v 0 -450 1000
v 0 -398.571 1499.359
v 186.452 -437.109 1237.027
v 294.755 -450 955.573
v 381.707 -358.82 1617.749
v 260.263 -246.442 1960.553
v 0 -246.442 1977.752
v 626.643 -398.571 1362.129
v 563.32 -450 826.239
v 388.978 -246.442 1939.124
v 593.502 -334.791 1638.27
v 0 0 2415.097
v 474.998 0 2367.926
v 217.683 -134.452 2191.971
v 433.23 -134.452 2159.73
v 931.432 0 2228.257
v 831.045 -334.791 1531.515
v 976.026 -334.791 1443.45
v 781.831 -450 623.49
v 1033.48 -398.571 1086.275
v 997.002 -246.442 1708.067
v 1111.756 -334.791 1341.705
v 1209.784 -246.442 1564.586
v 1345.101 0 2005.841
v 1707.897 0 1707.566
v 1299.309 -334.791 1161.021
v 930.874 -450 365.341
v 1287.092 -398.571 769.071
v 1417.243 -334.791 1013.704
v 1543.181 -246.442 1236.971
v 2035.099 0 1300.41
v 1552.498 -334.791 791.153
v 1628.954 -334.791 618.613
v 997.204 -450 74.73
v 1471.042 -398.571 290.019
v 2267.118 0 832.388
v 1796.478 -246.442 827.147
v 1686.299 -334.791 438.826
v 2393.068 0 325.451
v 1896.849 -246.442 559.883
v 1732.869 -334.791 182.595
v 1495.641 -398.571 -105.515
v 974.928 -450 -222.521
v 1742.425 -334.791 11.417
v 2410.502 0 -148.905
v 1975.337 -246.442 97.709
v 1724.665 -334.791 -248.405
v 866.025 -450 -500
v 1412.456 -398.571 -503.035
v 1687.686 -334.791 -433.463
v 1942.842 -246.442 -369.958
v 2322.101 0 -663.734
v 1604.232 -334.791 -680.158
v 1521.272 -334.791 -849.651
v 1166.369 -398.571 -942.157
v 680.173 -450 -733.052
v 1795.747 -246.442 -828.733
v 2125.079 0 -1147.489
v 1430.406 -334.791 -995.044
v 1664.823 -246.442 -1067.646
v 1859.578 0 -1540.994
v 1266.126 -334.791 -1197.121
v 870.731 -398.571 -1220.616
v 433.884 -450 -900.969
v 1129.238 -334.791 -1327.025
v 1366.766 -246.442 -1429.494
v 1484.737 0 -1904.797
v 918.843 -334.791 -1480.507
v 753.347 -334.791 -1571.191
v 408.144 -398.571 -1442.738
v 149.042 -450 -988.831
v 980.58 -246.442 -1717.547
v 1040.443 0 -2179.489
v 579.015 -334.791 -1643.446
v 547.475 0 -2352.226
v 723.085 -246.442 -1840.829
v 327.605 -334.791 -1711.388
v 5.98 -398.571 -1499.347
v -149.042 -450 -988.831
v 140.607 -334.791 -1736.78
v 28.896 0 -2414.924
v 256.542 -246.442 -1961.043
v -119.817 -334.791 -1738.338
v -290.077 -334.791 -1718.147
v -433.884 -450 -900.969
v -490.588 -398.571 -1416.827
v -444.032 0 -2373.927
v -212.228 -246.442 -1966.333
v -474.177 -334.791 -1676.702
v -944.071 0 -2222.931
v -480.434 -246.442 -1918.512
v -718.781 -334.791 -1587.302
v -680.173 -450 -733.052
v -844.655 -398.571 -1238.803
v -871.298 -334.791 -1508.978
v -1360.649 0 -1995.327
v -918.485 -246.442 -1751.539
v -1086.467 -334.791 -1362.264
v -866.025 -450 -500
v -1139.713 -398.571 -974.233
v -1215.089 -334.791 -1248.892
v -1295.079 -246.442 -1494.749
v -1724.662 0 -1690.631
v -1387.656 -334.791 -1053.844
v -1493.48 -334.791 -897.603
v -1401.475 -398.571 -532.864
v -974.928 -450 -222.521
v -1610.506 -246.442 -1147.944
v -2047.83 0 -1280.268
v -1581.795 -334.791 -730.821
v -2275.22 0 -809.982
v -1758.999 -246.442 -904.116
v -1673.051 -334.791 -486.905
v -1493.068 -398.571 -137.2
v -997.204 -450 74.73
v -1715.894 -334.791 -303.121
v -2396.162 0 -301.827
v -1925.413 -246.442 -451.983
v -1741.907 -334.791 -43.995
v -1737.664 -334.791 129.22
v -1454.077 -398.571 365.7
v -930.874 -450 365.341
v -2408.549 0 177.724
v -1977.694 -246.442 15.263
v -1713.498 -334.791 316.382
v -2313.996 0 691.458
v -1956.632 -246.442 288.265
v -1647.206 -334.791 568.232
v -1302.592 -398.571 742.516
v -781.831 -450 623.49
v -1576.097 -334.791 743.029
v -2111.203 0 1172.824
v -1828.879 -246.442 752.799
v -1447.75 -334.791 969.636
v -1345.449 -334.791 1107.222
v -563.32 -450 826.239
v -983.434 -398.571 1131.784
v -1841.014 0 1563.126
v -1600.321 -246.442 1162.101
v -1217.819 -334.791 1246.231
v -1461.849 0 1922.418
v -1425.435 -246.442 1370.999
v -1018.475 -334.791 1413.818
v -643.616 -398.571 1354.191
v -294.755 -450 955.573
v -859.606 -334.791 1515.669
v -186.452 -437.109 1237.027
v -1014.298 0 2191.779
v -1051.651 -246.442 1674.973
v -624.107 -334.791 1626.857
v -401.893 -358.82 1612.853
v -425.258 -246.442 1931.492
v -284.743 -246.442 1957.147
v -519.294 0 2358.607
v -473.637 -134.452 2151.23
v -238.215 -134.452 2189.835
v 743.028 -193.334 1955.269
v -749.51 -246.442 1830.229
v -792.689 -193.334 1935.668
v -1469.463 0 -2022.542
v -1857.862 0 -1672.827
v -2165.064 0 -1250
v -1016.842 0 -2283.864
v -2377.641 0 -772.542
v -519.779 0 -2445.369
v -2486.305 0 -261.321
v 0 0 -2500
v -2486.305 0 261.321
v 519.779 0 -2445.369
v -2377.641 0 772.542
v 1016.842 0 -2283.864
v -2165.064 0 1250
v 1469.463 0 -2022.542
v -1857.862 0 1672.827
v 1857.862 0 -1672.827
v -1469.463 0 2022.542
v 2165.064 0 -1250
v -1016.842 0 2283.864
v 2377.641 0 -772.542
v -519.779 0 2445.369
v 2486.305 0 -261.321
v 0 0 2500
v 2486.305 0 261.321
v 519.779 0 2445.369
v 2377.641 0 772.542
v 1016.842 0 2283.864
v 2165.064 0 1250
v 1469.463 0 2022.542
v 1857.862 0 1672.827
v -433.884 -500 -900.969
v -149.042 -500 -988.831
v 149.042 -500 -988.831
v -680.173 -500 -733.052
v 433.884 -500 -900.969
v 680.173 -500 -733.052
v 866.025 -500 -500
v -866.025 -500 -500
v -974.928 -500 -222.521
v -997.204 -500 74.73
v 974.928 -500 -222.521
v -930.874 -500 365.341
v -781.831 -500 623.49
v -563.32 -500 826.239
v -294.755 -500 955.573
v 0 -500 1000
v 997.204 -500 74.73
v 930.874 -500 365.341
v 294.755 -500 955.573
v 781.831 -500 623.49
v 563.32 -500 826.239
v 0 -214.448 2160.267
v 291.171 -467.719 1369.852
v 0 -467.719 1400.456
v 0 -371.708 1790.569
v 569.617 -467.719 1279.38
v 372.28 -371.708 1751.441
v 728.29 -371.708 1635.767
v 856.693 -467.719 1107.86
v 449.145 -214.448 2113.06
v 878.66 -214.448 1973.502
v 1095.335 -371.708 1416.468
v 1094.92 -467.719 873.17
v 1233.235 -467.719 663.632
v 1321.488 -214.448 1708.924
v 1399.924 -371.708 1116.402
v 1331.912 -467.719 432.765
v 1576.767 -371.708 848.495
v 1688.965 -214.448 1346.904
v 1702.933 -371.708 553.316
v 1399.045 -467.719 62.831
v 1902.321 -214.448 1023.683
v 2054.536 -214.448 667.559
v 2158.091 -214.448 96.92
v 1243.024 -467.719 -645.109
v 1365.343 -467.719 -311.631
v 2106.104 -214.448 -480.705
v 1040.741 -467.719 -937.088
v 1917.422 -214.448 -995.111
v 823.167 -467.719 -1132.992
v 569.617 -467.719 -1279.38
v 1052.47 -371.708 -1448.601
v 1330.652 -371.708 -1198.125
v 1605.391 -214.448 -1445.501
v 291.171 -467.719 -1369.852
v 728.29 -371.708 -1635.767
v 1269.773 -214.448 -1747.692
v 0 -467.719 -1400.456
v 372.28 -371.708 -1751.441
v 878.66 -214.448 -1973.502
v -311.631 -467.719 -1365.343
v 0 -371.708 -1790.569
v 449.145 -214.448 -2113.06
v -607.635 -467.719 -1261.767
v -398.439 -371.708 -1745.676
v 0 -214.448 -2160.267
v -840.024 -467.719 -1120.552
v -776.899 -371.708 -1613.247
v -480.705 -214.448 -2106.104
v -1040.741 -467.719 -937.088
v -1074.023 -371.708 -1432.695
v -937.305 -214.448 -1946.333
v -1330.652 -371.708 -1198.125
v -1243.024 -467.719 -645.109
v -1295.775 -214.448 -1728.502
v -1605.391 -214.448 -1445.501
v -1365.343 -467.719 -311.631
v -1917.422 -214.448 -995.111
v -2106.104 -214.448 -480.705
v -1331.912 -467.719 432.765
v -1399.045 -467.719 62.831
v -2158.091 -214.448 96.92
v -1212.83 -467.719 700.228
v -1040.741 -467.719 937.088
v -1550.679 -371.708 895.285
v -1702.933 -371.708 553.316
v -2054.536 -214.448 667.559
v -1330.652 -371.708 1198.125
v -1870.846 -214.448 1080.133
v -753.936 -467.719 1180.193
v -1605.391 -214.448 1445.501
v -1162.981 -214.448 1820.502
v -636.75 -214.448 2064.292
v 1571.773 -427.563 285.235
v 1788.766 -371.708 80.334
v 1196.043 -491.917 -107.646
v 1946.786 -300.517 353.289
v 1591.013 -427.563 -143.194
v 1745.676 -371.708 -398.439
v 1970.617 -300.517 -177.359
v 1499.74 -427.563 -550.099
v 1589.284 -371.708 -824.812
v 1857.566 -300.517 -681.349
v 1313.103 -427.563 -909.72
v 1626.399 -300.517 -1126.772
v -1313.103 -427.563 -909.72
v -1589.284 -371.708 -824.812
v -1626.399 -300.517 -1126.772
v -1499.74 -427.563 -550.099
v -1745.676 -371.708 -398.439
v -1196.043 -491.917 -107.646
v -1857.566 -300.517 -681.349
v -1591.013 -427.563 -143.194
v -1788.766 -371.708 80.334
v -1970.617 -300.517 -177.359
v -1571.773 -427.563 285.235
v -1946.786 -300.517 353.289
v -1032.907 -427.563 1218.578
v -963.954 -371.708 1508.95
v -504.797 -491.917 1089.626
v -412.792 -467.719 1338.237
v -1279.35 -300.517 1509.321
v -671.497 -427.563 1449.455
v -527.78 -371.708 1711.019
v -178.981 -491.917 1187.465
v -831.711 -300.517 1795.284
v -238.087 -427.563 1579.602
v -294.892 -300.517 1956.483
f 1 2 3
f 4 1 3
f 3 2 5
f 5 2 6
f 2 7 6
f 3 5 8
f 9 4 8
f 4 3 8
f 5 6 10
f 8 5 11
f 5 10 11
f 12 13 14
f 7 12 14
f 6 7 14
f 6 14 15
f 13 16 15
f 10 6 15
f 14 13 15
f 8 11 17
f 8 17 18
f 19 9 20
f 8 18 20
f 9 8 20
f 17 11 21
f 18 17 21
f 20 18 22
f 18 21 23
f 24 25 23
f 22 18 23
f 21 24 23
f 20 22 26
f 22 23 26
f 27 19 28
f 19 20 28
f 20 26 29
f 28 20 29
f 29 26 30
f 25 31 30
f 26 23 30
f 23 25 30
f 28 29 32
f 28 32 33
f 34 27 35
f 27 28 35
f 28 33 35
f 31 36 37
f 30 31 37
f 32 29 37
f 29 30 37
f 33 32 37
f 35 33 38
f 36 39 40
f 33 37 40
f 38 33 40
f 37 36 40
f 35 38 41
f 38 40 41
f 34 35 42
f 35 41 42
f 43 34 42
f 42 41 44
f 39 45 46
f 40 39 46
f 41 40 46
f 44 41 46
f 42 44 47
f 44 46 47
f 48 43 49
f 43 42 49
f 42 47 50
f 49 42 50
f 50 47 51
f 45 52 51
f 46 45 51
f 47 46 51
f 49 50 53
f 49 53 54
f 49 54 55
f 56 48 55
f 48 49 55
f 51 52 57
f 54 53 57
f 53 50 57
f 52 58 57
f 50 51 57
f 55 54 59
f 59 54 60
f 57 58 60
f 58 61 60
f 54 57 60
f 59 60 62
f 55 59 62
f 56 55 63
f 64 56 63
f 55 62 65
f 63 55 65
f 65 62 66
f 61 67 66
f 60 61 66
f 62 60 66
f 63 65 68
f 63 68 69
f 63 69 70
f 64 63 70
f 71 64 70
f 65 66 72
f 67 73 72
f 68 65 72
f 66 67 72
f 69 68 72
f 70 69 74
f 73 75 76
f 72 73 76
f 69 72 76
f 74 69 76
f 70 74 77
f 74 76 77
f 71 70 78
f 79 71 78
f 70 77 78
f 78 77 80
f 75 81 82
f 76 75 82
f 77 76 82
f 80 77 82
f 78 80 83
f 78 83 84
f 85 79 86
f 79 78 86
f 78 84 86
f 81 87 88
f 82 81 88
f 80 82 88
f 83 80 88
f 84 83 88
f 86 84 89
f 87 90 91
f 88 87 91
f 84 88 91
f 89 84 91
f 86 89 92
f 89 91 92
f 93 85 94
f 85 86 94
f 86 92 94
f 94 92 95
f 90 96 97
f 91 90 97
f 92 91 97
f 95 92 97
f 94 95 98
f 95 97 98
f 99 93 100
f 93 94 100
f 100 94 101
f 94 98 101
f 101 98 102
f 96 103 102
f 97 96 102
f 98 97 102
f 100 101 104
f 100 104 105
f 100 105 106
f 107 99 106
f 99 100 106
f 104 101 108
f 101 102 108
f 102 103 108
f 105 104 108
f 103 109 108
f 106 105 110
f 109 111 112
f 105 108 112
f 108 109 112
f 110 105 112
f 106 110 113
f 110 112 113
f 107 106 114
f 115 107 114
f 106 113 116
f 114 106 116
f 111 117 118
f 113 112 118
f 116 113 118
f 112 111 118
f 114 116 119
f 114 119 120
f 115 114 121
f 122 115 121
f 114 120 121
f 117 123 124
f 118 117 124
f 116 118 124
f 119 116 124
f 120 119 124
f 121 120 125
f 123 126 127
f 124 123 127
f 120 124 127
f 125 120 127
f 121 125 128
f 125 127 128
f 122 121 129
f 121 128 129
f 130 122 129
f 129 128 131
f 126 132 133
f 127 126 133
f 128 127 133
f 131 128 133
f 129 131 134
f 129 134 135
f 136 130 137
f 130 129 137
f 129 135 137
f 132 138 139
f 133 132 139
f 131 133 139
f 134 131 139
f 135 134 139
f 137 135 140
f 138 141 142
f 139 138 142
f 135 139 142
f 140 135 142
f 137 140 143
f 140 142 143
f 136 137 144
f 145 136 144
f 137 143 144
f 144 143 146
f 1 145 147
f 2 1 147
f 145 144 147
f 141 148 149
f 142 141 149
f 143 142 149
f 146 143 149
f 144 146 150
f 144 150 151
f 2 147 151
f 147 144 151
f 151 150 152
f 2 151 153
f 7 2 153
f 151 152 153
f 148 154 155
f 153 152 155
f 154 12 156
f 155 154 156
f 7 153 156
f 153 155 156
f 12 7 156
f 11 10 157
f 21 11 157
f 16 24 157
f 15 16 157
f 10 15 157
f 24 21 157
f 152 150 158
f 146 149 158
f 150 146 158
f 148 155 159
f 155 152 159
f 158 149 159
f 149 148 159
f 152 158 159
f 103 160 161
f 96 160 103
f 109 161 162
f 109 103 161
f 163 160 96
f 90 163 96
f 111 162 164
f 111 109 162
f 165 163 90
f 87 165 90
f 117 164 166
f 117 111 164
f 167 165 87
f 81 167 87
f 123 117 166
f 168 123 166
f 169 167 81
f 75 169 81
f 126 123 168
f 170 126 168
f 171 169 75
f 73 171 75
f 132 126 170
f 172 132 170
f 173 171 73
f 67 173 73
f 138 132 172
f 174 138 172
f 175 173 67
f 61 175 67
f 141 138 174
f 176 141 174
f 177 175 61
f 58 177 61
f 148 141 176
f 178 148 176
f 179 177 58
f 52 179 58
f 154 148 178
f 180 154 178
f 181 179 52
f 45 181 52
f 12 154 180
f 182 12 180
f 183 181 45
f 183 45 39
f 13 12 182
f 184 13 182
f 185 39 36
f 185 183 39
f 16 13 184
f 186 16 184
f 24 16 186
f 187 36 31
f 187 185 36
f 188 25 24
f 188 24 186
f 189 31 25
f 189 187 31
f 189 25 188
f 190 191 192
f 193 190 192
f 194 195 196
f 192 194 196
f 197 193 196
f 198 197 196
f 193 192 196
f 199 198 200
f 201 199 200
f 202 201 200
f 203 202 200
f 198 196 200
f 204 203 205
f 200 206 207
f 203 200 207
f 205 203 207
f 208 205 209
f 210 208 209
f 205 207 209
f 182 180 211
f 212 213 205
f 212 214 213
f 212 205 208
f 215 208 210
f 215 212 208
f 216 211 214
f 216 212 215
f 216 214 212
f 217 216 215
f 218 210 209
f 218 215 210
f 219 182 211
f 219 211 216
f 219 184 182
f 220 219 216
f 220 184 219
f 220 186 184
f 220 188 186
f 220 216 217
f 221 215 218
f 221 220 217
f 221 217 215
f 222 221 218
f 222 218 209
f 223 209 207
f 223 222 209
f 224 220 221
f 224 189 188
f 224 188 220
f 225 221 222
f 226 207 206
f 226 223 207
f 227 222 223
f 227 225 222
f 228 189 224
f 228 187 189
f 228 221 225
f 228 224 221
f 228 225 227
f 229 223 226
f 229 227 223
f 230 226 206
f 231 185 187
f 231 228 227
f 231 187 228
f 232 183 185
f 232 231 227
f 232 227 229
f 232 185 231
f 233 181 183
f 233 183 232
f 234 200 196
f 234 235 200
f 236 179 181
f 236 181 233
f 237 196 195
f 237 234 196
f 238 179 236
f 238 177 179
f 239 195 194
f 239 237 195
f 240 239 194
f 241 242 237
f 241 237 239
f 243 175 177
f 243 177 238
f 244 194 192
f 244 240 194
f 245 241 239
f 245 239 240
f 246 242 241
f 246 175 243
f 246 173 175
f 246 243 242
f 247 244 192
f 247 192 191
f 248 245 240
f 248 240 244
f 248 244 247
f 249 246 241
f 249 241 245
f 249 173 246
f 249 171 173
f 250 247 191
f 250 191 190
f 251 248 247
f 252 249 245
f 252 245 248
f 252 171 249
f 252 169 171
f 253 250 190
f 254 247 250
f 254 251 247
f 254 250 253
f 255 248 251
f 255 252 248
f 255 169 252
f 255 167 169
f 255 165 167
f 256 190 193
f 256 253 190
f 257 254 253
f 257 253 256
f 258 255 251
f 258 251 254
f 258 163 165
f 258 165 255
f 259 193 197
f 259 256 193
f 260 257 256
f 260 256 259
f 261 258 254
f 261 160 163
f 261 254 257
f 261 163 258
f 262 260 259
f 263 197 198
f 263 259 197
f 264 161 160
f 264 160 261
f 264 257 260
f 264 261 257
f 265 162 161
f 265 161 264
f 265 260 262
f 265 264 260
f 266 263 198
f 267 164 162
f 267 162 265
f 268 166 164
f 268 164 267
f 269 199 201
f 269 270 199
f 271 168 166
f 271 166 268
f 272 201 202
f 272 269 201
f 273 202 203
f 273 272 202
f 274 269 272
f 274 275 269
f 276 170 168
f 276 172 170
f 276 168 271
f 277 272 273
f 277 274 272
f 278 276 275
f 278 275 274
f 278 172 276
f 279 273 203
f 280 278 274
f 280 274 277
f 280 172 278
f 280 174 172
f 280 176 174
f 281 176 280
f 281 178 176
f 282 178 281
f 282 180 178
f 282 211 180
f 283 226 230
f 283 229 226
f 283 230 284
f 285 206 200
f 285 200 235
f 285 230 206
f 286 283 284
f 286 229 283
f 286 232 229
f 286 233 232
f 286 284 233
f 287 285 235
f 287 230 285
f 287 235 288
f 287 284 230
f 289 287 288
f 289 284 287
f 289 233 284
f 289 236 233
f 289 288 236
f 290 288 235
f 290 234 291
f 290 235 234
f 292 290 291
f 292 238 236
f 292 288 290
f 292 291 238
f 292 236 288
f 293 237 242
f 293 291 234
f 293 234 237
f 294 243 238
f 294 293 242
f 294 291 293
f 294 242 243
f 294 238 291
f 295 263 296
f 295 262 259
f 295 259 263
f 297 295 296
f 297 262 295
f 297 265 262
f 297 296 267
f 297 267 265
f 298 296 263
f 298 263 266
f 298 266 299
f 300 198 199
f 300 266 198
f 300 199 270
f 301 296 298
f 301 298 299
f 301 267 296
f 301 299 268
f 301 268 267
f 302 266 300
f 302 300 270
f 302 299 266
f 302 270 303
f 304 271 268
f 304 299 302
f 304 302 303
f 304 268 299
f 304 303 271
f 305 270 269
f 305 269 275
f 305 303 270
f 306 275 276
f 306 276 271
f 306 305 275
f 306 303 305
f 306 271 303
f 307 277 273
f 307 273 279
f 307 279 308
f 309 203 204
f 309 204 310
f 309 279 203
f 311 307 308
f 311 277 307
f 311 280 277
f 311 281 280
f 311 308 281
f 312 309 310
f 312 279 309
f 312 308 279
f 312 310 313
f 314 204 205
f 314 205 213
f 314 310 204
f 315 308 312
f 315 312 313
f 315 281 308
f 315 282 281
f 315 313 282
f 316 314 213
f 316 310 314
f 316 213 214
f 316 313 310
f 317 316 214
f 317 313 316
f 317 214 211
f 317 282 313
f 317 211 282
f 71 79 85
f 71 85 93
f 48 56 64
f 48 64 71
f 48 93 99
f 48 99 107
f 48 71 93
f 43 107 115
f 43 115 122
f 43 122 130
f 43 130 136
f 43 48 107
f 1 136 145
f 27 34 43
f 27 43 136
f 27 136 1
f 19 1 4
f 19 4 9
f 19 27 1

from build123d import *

# Parameters (mm, degrees)
SKETCH1_R           = 2500
BOSS_EXTRUDE1_DEPTH = 500
FILLET1_R           = 2500
SHELL1_T            = -50


with BuildPart() as part:
    # Sketch1 → Boss-Extrude1 (new body)
    with BuildSketch(Plane(origin=(0, 0, 0), x_dir=(1, 0, 0), z_dir=(0, 1, 0))):
        with Locations(Location((0, 0, 0), (0, 0, 270))):
            Circle(SKETCH1_R)
    extrude(amount=-BOSS_EXTRUDE1_DEPTH)

    # Fillet1
    # the kernel refuses this fillet: 2500 mm, written as the material it takes off along each edge
    with BuildSketch(Plane(origin=(0, -500, 0), x_dir=(0, 0, 1), z_dir=(-1, 0, 0))) as fillet1_piece_1:
        with BuildLine():
            CenterArc((1000, 2500), FILLET1_R, 270, 36.869897646)
            Line((1000, 0), (1000, -50))
            Line((1000, -50), (2500, -50))
            Line((2500, -50), (2550, 0))
            ThreePointArc((2550, 0), (2550, 250), (2530, 460))
            Line((2530, 460), (2500, 500))
        make_face()
    revolve(axis=Axis((0, -500, 0), (0, 1, 0)), mode=Mode.SUBTRACT)

    # Shell1
    shell1_openings = [part.faces().sort_by_distance(p)[0] for p in [
        (0, 0, 0),
    ]]
    offset(amount=SHELL1_T, openings=shell1_openings, kind=Kind.INTERSECTION)


solid = part.part
